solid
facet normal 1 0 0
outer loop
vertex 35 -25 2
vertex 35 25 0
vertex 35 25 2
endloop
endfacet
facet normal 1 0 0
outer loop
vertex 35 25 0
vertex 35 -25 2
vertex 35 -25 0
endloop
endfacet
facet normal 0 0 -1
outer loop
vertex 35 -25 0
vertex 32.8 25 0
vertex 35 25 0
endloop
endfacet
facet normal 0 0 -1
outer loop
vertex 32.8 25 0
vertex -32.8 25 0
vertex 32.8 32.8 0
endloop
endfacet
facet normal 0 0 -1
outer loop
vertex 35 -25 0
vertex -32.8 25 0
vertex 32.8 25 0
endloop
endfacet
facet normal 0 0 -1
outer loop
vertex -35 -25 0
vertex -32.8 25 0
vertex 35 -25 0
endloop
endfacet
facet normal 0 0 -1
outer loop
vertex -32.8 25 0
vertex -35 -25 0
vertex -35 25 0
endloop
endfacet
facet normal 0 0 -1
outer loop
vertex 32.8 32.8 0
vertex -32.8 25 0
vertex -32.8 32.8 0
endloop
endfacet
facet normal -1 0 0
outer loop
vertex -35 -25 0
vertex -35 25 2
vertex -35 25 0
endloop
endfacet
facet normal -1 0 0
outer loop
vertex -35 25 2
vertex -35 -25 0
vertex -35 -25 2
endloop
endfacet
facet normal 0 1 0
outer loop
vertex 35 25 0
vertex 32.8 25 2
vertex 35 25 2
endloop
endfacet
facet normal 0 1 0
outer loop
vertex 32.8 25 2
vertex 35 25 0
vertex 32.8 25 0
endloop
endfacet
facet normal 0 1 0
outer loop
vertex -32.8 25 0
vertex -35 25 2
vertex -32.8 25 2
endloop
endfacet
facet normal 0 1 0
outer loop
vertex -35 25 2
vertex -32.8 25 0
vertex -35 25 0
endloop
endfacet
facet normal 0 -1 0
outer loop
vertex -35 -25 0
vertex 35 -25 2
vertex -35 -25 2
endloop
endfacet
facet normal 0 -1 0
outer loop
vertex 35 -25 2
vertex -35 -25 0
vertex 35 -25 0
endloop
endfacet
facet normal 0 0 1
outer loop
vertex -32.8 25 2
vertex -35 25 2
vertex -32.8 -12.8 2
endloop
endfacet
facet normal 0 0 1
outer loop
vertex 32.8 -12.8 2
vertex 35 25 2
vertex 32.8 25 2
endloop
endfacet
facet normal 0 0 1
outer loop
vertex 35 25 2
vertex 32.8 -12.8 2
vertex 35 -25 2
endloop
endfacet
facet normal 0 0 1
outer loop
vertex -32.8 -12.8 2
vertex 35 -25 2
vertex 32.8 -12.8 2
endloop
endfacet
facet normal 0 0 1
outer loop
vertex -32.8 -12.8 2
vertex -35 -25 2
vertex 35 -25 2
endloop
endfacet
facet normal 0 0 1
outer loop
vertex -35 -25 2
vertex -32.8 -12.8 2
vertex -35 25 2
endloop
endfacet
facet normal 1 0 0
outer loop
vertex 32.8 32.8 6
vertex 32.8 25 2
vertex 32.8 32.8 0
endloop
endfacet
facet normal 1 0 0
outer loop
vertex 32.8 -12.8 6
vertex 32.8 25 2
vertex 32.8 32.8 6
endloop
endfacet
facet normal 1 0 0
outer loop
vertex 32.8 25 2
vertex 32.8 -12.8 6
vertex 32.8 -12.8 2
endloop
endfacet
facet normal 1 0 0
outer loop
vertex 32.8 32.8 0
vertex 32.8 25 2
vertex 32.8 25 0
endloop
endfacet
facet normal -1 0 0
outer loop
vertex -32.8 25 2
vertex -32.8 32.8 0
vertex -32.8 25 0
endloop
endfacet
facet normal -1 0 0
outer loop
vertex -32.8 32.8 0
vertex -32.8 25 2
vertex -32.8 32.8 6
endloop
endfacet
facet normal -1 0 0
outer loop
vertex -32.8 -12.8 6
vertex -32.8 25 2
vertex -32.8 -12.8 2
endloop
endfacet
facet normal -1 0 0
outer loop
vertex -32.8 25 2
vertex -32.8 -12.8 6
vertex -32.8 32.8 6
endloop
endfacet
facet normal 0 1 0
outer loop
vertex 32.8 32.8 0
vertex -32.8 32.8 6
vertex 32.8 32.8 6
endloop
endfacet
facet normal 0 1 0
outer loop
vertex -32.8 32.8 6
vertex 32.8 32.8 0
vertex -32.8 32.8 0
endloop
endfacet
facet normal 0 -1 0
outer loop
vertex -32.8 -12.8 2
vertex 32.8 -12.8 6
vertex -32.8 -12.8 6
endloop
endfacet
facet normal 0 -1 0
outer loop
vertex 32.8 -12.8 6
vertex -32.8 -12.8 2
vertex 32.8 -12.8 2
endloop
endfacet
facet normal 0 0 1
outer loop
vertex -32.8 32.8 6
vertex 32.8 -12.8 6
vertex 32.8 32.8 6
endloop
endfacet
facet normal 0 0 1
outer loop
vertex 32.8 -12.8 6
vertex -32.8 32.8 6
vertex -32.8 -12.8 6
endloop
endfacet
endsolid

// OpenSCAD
// Two-part enclosure for small electronics board
// Print orientation: box standing on bed, lid upside down (plate on bed)

$fn = 64;

// ---- Box ----
box_x = 70;      // outer length (X)
box_y = 50;      // outer width (Y)
box_z = 30;      // outer height (Z)
wall = 2;        // wall thickness
floor = 2;       // floor thickness

// ---- Lid ----
lip_w = 65.6;    // lip outer length (X)
lip_d = 45.6;    // lip outer width (Y)
lip_h = 4;       // lip height (wall above plate)
plate_t = 2;     // plate thickness
clearance = 0.2; // gap between lip outer and box inner (each side)

// ---- Layout ----
gap = 10;        // gap between box and lid on bed
lip_overlap = wall + clearance; // lip extends into box opening

module box() {
    difference() {
        translate([-box_x/2, -box_y/2, 0])
            cube([box_x, box_y, box_z]);
        // open top: cut down to floor height
        translate([-box_x/2 - 1, -box_y/2 - 1, floor])
            cube([box_x + 2, box_y + 2, box_z - floor + 1]);
    }
}

module lid() {
    union() {
        // plate
        translate([-lip_w/2, -lip_d/2, 0])
            cube([lip_w, lip_d, plate_t]);
        // lip
        translate([-lip_w/2, -lip_d/2, plate_t])
            cube([lip_w, lip_d, lip_h]);
    }
}

box();
translate([0, gap, 0]) lid();
